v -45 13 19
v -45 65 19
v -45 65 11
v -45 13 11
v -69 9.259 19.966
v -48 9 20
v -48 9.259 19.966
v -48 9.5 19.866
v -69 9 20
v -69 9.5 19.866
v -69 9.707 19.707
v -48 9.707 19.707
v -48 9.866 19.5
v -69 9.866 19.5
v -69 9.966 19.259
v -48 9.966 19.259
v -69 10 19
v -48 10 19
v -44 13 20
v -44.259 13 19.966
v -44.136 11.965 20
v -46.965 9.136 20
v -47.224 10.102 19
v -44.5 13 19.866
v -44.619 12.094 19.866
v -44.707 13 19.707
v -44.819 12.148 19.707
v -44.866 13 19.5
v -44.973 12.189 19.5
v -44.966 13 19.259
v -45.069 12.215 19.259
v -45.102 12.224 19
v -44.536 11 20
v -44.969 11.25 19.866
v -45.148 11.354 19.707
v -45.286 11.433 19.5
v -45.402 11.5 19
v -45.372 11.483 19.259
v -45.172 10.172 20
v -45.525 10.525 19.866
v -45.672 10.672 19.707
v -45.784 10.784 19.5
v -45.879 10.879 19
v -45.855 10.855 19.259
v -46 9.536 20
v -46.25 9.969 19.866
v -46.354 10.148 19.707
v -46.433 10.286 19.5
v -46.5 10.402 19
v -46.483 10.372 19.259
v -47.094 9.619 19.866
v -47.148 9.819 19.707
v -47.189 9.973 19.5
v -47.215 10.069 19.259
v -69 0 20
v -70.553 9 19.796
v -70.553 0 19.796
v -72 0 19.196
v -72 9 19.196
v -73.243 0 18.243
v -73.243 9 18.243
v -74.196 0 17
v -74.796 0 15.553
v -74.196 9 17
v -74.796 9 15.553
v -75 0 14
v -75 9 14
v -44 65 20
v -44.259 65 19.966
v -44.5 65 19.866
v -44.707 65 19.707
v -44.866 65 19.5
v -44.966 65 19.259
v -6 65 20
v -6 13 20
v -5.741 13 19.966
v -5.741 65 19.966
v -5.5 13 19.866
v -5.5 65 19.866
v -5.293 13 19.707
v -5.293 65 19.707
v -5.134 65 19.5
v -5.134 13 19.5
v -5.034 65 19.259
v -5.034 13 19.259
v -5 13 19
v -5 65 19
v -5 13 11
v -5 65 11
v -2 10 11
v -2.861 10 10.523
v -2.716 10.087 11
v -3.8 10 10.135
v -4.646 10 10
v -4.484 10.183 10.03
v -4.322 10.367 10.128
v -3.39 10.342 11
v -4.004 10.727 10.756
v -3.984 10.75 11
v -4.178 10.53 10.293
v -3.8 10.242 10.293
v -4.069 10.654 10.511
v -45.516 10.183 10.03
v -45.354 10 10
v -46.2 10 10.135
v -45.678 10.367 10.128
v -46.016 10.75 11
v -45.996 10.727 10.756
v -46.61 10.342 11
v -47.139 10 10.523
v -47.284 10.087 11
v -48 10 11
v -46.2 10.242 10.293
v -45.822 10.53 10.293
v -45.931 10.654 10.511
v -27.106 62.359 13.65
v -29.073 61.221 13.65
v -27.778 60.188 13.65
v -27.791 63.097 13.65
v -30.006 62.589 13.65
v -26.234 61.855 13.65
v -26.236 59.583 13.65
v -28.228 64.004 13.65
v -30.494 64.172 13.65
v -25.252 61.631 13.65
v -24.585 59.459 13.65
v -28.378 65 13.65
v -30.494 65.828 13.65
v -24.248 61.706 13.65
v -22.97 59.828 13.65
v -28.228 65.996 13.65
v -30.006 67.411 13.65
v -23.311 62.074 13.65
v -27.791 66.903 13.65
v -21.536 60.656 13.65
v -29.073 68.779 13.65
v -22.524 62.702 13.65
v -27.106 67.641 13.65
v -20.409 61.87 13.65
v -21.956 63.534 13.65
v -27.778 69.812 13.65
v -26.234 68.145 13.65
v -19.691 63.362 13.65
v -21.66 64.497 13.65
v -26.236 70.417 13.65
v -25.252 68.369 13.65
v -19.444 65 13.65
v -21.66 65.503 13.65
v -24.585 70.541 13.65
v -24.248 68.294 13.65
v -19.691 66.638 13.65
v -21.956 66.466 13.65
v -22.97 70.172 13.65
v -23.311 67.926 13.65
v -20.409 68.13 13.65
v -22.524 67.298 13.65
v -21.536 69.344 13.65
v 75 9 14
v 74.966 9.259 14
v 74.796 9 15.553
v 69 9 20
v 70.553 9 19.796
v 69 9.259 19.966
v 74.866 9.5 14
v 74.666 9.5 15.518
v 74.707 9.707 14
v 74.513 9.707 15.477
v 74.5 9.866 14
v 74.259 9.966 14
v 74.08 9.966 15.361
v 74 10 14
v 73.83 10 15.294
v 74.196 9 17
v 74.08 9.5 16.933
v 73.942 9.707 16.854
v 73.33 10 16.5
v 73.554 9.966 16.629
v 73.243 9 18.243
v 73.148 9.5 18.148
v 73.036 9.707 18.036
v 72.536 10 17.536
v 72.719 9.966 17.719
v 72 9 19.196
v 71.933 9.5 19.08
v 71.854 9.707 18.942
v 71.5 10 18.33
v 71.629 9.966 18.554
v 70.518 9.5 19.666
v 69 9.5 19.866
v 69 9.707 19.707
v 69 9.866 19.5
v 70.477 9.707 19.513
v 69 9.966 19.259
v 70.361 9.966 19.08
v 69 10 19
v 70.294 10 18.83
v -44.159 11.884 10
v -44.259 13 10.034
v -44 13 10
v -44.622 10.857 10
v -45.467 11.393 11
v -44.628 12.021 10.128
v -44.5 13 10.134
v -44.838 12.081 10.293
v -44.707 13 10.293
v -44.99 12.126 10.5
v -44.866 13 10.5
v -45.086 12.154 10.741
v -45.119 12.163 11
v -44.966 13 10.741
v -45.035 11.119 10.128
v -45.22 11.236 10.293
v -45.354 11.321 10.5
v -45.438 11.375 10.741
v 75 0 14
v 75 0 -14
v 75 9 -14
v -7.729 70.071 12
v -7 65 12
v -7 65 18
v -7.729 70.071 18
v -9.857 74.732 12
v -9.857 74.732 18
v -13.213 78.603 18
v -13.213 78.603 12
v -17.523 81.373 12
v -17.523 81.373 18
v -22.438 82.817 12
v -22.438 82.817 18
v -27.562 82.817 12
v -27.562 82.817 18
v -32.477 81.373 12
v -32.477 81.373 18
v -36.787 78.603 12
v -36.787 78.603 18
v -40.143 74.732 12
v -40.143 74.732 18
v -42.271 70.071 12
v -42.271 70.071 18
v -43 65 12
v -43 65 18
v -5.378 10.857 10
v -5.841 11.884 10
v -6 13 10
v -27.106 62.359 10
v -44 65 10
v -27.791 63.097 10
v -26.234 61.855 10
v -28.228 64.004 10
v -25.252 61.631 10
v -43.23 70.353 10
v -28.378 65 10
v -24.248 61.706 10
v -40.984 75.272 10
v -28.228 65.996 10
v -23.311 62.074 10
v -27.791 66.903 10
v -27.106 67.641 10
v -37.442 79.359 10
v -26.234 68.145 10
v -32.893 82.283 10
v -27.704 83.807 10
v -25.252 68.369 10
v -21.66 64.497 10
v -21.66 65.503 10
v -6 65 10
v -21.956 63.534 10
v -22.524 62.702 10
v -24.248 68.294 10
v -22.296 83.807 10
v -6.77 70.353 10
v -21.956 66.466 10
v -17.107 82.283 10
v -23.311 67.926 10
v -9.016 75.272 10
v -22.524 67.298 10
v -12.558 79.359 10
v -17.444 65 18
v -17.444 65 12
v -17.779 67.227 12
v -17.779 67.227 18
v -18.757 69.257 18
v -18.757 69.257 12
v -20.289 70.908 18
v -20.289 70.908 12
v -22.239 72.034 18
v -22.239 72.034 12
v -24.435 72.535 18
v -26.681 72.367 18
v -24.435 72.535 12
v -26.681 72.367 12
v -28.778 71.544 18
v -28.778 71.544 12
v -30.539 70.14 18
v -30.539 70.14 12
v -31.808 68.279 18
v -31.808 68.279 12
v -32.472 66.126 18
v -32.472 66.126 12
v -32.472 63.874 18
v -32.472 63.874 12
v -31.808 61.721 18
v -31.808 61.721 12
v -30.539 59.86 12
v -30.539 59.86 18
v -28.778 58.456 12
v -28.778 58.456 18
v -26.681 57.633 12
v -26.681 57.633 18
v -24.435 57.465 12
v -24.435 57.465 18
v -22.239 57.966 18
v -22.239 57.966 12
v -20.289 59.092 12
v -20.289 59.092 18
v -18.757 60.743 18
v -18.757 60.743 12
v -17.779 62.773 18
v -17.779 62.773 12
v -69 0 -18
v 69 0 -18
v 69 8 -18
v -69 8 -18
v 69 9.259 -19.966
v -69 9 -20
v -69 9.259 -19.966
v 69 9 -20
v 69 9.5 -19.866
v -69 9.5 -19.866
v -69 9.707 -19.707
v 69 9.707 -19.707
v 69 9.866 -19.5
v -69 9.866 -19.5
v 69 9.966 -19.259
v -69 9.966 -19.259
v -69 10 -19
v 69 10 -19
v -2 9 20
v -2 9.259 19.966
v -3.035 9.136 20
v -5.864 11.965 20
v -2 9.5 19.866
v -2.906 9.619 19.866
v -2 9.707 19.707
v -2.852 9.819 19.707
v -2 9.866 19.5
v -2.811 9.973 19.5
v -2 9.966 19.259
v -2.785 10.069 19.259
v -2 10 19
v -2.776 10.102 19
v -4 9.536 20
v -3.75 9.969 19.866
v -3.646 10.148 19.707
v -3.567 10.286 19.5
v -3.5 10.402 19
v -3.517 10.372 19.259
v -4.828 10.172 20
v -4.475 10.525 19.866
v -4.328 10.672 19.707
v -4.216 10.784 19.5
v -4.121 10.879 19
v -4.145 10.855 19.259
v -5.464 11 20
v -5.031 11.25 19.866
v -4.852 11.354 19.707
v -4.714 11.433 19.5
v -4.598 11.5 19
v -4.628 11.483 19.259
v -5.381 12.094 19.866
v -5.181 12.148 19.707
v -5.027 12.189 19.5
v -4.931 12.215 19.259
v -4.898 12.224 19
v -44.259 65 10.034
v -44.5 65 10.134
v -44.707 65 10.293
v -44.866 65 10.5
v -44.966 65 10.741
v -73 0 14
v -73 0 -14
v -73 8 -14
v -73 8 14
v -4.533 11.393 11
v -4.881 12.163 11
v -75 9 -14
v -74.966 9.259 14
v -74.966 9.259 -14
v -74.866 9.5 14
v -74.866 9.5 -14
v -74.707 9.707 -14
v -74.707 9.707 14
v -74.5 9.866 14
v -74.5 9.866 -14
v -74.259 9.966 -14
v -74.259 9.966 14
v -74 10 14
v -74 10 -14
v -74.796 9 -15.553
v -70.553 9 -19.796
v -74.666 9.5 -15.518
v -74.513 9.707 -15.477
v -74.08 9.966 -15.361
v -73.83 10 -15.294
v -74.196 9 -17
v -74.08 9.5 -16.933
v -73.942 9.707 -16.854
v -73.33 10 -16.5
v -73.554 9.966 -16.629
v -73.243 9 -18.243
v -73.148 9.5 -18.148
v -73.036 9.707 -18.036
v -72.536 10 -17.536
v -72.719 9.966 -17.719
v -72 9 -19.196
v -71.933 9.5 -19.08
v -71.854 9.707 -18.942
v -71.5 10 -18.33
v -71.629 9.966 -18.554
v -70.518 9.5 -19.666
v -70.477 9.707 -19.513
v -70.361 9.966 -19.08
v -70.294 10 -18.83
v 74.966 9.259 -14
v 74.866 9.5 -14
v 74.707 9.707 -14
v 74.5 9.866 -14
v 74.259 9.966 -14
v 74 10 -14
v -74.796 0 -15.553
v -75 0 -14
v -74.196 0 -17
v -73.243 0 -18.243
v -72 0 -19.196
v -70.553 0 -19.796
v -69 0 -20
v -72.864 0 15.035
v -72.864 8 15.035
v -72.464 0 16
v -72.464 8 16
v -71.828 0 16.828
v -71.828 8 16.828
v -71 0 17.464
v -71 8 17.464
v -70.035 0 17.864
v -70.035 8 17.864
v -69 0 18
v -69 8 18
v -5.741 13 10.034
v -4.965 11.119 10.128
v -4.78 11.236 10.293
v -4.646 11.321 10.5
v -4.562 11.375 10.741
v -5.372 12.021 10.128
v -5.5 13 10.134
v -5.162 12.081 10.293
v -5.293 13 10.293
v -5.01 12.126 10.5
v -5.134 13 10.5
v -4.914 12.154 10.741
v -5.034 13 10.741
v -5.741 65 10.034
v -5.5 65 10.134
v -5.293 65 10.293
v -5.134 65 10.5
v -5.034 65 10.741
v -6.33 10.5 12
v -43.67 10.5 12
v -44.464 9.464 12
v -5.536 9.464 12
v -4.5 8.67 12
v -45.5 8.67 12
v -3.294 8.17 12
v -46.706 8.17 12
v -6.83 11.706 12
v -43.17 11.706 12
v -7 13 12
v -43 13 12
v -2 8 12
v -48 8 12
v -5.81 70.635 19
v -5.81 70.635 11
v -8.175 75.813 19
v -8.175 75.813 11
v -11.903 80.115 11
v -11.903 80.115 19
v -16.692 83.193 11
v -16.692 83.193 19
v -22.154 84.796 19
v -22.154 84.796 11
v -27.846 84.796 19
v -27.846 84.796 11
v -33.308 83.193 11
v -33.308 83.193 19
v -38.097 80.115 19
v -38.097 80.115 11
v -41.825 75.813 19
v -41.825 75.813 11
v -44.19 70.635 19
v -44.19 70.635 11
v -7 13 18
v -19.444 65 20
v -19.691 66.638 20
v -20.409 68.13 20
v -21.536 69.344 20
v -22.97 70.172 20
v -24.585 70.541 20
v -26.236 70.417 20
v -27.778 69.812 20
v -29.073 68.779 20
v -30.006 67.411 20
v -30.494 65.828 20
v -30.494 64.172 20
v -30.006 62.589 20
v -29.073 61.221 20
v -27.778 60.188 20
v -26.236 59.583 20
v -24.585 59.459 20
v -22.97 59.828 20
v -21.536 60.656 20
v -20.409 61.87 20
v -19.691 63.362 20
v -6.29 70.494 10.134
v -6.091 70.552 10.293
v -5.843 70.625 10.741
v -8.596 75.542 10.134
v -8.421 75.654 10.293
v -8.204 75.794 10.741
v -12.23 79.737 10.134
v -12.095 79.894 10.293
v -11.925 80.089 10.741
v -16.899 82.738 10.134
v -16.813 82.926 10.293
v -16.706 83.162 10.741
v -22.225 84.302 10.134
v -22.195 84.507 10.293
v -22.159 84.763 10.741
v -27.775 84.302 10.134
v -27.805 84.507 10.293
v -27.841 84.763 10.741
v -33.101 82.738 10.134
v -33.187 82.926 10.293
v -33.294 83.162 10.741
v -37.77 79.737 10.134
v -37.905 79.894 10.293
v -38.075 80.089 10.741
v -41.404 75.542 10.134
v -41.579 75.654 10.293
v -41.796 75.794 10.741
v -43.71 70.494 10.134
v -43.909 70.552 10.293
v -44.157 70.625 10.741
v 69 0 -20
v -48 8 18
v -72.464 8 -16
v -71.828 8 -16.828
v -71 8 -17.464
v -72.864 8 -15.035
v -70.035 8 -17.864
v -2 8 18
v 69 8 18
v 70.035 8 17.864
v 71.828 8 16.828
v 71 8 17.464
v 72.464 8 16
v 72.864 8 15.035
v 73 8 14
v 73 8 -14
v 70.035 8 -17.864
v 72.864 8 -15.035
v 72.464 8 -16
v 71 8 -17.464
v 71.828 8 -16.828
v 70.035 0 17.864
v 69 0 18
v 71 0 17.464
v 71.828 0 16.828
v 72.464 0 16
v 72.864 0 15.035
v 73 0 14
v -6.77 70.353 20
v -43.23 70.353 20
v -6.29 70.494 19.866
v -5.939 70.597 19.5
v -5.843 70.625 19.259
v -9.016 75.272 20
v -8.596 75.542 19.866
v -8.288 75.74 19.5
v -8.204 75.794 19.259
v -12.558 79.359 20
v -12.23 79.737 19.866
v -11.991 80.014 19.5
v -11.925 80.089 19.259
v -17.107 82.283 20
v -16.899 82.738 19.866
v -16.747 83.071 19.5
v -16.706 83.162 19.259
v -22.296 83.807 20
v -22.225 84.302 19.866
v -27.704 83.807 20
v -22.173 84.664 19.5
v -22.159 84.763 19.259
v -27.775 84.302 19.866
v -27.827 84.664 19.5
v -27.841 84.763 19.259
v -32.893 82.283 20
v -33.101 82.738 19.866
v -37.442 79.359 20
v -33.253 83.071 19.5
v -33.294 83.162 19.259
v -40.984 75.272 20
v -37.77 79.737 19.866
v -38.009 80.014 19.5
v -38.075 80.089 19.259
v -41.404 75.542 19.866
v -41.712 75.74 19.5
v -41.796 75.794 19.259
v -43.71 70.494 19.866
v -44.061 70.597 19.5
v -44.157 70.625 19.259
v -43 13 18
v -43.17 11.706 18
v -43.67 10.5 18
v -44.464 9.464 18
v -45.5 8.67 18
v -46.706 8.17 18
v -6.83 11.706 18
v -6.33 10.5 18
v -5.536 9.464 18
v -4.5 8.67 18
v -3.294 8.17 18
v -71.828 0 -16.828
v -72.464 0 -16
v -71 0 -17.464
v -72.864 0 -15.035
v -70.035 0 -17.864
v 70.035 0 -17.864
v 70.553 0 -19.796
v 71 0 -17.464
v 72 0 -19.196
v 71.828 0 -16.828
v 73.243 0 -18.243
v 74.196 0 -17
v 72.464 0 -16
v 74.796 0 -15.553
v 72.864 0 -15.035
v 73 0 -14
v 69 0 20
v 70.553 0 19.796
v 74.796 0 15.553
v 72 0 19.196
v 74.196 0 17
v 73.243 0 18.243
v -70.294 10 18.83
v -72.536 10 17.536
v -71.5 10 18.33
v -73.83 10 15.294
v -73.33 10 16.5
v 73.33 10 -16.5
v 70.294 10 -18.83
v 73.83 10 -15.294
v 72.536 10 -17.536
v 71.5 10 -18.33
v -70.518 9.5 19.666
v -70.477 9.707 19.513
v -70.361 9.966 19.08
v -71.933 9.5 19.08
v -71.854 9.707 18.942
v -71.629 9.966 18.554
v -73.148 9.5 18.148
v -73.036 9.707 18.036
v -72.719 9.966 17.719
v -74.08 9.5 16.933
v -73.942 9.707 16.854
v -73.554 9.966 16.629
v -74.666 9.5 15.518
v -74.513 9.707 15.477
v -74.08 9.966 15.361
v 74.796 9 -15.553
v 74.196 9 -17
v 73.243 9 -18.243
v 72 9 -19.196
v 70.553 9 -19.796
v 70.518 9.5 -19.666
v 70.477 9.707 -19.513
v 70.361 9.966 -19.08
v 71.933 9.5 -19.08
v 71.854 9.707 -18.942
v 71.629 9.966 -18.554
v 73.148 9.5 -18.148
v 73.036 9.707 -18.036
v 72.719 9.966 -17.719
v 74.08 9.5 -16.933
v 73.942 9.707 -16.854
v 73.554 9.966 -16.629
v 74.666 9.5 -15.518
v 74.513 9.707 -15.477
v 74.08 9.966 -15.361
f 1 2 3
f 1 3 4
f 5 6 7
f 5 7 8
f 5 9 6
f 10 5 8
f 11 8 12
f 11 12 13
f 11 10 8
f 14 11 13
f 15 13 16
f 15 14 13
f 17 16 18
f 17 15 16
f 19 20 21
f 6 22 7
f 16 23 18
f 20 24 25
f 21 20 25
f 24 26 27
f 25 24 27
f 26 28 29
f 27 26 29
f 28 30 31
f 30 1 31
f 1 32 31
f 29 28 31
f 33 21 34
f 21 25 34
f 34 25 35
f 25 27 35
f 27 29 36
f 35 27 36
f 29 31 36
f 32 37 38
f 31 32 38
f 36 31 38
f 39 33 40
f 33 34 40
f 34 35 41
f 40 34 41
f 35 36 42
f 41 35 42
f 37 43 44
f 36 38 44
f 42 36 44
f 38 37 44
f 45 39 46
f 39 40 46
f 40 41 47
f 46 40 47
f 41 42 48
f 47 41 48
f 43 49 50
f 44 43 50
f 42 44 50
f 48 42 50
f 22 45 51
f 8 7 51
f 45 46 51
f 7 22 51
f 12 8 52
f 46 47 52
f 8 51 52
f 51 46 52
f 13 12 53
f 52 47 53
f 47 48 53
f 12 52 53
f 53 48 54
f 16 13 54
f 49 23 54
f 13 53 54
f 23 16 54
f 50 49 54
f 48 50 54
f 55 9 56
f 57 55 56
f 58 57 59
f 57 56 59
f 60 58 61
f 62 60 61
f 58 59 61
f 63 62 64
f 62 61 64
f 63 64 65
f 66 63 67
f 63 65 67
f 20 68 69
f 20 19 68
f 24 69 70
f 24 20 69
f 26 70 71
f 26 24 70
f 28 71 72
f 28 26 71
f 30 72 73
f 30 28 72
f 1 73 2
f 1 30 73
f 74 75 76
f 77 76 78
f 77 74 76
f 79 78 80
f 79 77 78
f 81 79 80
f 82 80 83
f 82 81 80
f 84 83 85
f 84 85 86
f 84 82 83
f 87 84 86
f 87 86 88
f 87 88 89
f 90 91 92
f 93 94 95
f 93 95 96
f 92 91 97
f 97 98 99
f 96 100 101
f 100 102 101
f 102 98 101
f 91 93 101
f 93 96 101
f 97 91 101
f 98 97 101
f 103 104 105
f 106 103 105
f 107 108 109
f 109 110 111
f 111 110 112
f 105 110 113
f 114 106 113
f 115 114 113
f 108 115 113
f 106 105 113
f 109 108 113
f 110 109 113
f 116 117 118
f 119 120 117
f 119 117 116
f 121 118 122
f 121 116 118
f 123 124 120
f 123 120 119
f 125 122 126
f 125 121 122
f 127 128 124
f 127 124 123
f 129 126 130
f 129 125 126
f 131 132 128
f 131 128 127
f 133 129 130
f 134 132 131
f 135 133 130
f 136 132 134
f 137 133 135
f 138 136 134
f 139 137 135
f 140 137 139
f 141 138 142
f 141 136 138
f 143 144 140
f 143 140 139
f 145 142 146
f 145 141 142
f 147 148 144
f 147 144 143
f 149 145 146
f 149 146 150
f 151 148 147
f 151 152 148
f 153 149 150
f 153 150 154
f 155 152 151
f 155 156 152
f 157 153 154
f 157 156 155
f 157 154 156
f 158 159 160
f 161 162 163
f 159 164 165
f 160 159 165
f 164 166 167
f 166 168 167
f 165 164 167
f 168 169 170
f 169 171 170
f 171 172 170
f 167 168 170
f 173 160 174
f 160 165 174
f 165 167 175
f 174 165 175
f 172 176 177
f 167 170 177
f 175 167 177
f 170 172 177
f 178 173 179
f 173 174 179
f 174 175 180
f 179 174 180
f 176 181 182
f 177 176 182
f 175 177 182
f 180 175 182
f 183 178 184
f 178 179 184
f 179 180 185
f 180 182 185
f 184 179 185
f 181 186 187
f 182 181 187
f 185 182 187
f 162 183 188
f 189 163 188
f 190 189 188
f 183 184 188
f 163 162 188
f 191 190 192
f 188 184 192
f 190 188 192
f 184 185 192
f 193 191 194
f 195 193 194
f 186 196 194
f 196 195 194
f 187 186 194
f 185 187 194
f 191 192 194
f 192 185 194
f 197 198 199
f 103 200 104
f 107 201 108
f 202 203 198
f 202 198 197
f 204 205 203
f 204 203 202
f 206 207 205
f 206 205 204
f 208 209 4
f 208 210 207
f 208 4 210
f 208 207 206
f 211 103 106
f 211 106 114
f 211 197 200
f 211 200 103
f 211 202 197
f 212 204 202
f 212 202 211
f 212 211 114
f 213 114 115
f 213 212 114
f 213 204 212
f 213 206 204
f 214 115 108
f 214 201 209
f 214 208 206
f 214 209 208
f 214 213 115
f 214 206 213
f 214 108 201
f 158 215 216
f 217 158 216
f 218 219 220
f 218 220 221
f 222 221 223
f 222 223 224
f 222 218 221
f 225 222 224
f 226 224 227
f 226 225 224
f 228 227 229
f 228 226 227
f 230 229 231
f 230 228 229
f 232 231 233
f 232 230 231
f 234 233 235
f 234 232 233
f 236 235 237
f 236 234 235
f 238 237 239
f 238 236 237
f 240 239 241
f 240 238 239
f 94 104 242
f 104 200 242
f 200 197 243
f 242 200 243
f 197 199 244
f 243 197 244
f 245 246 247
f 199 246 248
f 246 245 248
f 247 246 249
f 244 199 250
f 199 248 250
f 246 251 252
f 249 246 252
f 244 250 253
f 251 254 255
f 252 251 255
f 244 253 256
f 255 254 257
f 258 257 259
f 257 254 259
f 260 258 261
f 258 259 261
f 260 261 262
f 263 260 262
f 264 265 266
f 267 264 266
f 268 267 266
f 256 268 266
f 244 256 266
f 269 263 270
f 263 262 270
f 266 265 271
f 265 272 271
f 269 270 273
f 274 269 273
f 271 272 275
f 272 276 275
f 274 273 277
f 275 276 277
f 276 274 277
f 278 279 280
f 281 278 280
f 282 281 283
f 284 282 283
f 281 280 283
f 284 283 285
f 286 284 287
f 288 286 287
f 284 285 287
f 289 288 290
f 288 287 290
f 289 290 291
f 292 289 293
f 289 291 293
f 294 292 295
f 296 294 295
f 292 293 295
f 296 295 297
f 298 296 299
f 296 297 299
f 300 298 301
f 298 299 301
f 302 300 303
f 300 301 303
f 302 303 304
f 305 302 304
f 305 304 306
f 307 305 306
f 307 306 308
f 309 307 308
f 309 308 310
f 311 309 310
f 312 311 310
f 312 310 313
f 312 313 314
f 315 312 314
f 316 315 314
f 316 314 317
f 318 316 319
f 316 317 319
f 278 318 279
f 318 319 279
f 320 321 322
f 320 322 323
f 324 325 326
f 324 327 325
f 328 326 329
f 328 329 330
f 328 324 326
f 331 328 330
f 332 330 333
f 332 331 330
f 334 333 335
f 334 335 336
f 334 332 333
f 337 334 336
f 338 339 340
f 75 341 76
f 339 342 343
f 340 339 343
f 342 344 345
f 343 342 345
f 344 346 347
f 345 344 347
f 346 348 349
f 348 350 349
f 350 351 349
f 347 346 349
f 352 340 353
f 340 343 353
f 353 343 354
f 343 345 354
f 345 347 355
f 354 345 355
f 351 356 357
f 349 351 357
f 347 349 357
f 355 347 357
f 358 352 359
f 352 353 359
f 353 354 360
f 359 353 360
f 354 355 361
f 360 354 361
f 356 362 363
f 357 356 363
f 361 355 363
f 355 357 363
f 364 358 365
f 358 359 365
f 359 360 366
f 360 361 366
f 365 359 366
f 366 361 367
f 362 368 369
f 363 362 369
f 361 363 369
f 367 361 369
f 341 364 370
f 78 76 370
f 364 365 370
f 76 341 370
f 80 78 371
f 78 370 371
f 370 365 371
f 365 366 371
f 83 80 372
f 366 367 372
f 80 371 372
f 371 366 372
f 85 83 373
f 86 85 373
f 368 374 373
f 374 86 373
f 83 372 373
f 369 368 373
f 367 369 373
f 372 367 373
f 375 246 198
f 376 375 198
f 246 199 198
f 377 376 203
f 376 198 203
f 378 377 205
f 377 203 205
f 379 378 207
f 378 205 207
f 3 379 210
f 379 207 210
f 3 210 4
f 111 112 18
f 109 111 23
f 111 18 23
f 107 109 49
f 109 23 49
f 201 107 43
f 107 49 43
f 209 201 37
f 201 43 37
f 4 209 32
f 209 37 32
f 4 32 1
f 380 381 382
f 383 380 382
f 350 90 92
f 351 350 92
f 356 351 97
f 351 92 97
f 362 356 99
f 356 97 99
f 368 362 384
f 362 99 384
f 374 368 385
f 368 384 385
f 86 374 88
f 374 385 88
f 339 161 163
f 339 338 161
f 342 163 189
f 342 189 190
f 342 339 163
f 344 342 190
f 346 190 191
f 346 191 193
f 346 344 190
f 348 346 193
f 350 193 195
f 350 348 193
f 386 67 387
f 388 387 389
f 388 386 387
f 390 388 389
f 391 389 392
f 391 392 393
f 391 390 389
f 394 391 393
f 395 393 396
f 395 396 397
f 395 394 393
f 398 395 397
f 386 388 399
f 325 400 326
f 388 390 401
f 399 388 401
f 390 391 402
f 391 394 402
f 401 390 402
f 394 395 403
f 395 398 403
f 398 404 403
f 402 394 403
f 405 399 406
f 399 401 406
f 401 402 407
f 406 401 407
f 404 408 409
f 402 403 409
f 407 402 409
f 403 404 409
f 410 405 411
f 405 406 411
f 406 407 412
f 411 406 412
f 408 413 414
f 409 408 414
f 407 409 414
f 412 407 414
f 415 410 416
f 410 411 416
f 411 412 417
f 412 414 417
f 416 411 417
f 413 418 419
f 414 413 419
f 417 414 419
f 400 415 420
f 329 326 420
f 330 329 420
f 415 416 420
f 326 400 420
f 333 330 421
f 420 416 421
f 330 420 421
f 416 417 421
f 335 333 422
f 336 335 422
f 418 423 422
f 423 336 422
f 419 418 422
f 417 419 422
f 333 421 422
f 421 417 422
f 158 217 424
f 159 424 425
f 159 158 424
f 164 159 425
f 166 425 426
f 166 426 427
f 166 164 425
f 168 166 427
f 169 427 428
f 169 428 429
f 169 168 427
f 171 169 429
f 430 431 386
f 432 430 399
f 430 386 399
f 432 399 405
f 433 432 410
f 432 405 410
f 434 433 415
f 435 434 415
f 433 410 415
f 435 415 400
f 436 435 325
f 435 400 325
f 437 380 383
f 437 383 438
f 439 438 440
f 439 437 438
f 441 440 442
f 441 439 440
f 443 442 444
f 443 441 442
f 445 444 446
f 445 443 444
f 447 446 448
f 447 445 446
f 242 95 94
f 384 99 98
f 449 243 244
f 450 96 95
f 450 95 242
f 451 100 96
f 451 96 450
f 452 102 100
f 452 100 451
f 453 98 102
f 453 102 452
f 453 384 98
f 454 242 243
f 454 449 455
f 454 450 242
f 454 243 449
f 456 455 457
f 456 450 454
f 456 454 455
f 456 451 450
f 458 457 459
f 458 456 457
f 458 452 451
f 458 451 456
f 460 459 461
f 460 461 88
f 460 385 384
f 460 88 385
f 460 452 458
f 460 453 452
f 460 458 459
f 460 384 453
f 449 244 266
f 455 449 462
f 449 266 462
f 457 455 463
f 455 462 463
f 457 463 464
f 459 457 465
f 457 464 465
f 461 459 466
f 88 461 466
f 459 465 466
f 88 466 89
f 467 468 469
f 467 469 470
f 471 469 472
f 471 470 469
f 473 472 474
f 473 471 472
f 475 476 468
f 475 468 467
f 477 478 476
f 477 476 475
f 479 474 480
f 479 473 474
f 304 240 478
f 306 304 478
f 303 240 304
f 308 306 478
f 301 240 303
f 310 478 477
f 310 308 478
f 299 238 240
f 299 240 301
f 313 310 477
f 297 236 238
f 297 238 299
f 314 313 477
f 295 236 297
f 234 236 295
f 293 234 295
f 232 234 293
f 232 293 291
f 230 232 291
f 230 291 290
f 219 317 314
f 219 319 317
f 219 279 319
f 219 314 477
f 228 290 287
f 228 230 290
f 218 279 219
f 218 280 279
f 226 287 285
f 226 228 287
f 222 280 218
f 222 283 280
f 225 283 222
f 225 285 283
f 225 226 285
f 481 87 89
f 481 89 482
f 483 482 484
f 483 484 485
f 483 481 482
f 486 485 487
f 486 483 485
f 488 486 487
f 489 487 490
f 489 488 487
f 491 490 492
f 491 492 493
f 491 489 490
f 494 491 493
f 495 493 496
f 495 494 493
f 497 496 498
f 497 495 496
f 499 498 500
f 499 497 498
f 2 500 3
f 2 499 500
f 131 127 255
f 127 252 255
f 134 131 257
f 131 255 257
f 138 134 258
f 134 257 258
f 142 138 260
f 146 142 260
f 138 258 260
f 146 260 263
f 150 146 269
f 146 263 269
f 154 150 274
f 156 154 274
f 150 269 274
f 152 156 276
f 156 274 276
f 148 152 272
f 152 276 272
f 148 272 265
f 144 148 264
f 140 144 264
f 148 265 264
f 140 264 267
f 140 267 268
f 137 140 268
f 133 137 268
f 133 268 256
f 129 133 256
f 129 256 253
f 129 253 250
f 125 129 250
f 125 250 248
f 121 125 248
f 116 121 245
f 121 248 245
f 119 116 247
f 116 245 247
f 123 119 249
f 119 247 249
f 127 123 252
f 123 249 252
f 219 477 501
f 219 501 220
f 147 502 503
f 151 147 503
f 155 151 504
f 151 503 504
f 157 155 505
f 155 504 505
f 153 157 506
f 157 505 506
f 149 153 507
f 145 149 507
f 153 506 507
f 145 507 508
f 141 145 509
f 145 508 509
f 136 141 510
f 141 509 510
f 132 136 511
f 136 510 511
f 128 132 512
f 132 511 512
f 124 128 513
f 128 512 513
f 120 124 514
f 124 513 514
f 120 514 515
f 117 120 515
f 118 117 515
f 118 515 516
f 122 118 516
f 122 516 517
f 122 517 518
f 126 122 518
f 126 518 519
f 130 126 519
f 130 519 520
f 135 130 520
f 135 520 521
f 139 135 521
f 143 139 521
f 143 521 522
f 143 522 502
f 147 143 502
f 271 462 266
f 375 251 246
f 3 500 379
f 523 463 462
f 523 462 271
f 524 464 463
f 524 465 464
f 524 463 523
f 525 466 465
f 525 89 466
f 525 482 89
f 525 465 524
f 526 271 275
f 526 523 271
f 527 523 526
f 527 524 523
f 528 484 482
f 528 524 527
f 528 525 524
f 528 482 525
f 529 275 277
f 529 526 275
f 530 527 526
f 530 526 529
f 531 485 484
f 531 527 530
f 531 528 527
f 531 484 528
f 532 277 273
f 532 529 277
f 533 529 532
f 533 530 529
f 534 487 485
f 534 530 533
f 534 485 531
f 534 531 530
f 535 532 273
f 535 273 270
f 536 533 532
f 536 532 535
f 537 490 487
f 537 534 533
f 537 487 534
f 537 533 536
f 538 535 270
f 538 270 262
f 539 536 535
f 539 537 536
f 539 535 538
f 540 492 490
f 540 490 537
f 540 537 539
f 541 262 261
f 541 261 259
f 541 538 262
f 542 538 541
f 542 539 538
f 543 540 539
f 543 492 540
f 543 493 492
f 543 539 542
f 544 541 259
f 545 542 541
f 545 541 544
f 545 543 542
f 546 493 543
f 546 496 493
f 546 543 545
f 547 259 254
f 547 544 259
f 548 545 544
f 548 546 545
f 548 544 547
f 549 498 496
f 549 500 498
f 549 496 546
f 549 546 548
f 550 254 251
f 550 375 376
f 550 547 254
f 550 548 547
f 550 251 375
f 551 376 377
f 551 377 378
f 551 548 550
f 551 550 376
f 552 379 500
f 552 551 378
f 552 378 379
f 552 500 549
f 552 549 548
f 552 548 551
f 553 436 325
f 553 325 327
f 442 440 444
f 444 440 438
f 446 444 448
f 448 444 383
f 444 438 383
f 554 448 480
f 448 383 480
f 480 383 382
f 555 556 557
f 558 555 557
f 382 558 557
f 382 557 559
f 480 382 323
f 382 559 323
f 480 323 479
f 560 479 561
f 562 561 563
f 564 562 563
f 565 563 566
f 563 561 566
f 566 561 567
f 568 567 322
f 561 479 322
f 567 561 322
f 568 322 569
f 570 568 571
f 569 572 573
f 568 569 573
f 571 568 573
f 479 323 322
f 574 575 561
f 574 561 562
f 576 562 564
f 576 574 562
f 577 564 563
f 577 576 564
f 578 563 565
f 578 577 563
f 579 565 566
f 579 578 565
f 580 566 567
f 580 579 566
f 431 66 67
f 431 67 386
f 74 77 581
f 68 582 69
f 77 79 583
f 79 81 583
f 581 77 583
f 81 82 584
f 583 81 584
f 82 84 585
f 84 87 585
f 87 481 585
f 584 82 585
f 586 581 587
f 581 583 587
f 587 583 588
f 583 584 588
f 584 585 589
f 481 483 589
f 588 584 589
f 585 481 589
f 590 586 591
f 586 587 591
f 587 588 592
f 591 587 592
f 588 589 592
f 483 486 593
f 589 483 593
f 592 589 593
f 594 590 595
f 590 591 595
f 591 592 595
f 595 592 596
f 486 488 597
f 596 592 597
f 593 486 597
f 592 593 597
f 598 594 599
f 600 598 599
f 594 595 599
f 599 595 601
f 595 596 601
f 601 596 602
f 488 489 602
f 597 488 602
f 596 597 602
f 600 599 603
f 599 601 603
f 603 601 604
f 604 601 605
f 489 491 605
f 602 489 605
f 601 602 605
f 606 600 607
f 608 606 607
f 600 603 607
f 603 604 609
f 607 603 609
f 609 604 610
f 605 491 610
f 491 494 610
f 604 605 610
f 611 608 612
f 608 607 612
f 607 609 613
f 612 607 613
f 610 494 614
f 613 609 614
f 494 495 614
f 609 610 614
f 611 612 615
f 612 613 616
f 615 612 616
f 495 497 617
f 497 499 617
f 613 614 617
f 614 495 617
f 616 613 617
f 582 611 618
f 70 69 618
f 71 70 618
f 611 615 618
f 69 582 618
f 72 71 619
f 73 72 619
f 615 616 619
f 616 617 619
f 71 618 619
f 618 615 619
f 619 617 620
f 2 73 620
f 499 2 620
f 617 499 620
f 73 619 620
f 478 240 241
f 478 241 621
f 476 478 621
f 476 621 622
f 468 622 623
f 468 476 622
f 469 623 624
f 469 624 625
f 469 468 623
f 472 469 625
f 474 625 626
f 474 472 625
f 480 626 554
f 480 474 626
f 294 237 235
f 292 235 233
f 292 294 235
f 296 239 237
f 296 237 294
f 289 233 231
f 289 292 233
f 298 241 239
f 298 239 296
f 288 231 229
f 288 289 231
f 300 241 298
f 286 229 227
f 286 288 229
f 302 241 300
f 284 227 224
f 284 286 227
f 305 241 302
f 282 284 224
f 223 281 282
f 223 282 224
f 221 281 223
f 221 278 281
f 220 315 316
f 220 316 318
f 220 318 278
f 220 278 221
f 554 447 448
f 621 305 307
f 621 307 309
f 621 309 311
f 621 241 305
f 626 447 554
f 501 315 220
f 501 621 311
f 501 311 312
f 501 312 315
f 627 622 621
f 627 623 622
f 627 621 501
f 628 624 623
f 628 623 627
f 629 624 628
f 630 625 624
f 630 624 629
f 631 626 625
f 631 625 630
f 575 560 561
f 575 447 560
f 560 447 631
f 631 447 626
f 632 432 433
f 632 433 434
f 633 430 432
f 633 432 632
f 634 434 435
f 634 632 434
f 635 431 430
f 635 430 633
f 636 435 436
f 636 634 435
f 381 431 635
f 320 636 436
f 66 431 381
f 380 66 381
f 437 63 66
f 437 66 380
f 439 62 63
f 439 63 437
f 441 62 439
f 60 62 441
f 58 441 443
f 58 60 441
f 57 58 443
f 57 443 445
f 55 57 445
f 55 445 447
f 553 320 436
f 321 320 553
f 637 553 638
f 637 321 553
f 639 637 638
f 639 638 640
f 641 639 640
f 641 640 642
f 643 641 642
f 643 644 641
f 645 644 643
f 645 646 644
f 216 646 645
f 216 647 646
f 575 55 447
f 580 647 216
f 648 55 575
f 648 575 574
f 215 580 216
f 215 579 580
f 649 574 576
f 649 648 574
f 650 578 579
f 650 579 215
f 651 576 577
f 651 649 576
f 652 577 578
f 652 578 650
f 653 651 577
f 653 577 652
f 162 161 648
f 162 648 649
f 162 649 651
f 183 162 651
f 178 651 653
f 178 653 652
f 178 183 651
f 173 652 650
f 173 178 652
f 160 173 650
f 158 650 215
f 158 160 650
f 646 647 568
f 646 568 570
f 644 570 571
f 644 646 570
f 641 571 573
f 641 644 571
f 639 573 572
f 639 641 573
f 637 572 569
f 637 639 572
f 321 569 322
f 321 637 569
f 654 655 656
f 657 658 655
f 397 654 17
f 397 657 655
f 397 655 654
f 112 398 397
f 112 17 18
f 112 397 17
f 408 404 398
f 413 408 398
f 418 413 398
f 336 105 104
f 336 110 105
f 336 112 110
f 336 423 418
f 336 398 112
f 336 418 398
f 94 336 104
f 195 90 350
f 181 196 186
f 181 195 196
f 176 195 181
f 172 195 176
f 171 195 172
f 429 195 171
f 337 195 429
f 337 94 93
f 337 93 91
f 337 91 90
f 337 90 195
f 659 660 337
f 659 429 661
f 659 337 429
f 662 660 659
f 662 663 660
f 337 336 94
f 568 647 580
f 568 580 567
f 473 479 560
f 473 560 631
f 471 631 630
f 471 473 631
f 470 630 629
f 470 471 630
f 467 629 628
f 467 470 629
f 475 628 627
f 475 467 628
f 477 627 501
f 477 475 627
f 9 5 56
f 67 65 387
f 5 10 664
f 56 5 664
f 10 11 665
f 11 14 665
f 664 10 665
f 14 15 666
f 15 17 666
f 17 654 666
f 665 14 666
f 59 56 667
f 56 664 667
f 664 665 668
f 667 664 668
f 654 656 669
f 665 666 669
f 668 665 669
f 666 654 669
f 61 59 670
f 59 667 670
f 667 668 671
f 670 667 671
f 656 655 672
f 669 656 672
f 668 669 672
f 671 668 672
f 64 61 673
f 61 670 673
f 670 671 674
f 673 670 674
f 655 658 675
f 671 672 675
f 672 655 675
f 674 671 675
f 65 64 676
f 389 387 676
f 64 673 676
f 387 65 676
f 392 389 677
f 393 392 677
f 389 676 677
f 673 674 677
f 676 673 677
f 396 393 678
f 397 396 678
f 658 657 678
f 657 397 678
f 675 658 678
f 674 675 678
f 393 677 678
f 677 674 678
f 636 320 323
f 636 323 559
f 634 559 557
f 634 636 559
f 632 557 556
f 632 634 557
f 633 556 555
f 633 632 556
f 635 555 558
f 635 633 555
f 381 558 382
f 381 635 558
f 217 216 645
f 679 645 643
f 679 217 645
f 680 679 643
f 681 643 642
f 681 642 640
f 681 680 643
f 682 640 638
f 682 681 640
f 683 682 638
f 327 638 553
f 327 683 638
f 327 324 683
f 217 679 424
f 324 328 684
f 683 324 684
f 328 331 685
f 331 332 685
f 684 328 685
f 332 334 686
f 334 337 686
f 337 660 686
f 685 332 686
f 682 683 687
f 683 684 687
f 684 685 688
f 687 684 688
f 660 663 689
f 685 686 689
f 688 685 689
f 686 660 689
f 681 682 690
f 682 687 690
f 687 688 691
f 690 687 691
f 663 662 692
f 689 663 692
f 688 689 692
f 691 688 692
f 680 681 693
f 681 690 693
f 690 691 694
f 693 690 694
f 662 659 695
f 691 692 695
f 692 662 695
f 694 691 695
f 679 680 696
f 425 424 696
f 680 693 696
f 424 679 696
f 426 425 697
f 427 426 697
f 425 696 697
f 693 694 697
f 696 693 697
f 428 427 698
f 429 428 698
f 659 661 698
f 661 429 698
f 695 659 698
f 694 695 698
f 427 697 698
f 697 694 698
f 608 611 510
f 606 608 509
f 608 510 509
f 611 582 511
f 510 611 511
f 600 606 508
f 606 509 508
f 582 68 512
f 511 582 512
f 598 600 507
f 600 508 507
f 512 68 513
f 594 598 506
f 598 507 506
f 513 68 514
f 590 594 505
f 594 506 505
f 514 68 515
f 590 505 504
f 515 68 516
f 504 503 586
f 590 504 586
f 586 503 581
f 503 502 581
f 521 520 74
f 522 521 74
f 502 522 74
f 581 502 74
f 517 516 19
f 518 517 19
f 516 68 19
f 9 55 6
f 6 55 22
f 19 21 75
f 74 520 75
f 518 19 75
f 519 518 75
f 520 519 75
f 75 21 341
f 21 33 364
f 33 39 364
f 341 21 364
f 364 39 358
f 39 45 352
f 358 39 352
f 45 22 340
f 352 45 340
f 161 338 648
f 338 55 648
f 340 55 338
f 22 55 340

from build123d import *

# Parameters (mm, degrees)
SKETCH1_W                                        = 150
SKETCH1_H                                        = 40
BOSS_EXTRUDE1_DEPTH                              = 10
BOSS_EXTRUDE2_DEPTH                              = 10
CBORE_FOR_1_4_SOCKET_HEAD_CAP_SCREW1_D           = 6.7564
CBORE_FOR_1_4_SOCKET_HEAD_CAP_SCREW1_CBORE_D     = 11.1125
CBORE_FOR_1_4_SOCKET_HEAD_CAP_SCREW1_CBORE_DEPTH = 6.35
FILLET1_R                                        = 6
FILLET2_R                                        = 3
FILLET3_R                                        = 1
SHELL4_START                                     = -14
SHELL4_OUTLINE_W                                 = 146
SHELL4_OUTLINE_H                                 = 8
SHELL4_DEPTH                                     = 28
SHELL4_START_2                                   = 12
SHELL4_2_OUTLINE_R                               = 7.55625
SHELL4_2_DEPTH                                   = 6
SHELL4_3_DEPTH                                   = 8


with BuildPart() as part:
    # Sketch1 → Boss-Extrude1 (new body)
    with BuildSketch(Plane(origin=(0, 0, 0), x_dir=(1, 0, 0), z_dir=(0, 1, 0))):
        Rectangle(SKETCH1_W, SKETCH1_H)
    extrude(amount=BOSS_EXTRUDE1_DEPTH)

    # Sketch2 → Boss-Extrude2 (add)
    with BuildSketch(Plane.XY.offset(20)):
        with BuildLine():
            Line((-45, 0), (-5, 0))
            Line((-5, 0), (-5, 65))
            ThreePointArc((-5, 65), (-25, 85), (-45, 65))
            Line((-45, 65), (-45, 0))
        make_face()
    extrude(amount=-BOSS_EXTRUDE2_DEPTH)

    # CBORE for 1/4 Socket Head Cap Screw1 (through all)
    with Locations(Plane.XY.offset(20)):
        with Locations((-25, 65)):
            CounterBoreHole(CBORE_FOR_1_4_SOCKET_HEAD_CAP_SCREW1_D / 2, CBORE_FOR_1_4_SOCKET_HEAD_CAP_SCREW1_CBORE_D / 2, CBORE_FOR_1_4_SOCKET_HEAD_CAP_SCREW1_CBORE_DEPTH)

    # Fillet1
    fillet1_edges = [part.edges().sort_by_distance(p)[0] for p in [
        (-75, 5, -20),
        (75, 5, -20),
        (75, 5, 20),
        (-75, 5, 20),
    ]]
    fillet(fillet1_edges, radius=FILLET1_R)

    # Fillet2
    fillet2_edges = [part.edges().sort_by_distance(p)[0] for p in [
        (-45, 10, 15),
        (-5, 10, 15),
    ]]
    fillet(fillet2_edges, radius=FILLET2_R)

    # Fillet3
    fillet3_edges = [part.edges().sort_by_distance(p)[0] for p in [
        (-45, 39, 10),
        (-25, 85, 10),
        (-45, 39, 20),
        (-25, 85, 20),
        (0, 10, -20),
        (75, 10, 0),
        (-75, 10, 0),
        (-58.5, 10, 20),
        (73.242640687, 10, 18.242640687),
        (-73.242640687, 10, 18.242640687),
        (-73.242640687, 10, -18.242640687),
        (73.242640687, 10, -18.242640687),
        (33.5, 10, 20),
        (-5, 39, 20),
        (-5, 39, 10),
        (-45.878679656, 10.878679656, 20),
        (-45.878679656, 10.878679656, 10),
        (-4.121320344, 10.878679656, 10),
        (-4.121320344, 10.878679656, 20),
    ]]
    fillet(fillet3_edges, radius=FILLET3_R)

    # Shell4: read off the stored shape, not the designer's step
    # Shell4 outline → Shell4 (cut)
    with BuildSketch(Plane.XY.offset(SHELL4_START)):
        with Locations((0, 4)):
            Rectangle(SHELL4_OUTLINE_W, SHELL4_OUTLINE_H)
    extrude(amount=SHELL4_DEPTH, mode=Mode.SUBTRACT)

    # Shell4 2 outline → Shell4 2 (cut)
    with BuildSketch(Plane.XY.offset(SHELL4_START_2)):
        with BuildLine():
            ThreePointArc((-43, 13), (-44.464466094, 9.464466094), (-48, 8))
            Line((-48, 8), (-2, 8))
            ThreePointArc((-2, 8), (-5.535533906, 9.464466094), (-7, 13))
            Line((-7, 13), (-7, 65))
            ThreePointArc((-7, 65), (-25, 83), (-43, 65))
            Line((-43, 65), (-43, 13))
        make_face()
        with Locations((-25, 65)):
            Circle(SHELL4_2_OUTLINE_R, mode=Mode.SUBTRACT)
    extrude(amount=SHELL4_2_DEPTH, mode=Mode.SUBTRACT)

    # Shell4 3 outline → Shell4 3 (cut)
    with BuildSketch(Plane(origin=(0, 0, 0), x_dir=(1, 0, 0), z_dir=(0, 1, 0))):
        with BuildLine():
            Line((-69, -18), (69, -18))
            ThreePointArc((69, -18), (71.828427125, -16.828427125), (73, -14))
            Line((73, -14), (-73, -14))
            ThreePointArc((-73, -14), (-71.828427125, -16.828427125), (-69, -18))
        make_face()
        with BuildLine():
            Line((69, 18), (-69, 18))
            ThreePointArc((-69, 18), (-71.828427125, 16.828427125), (-73, 14))
            Line((-73, 14), (73, 14))
            ThreePointArc((73, 14), (71.828427125, 16.828427125), (69, 18))
        make_face()
    extrude(amount=SHELL4_3_DEPTH, mode=Mode.SUBTRACT)


solid = part.part
